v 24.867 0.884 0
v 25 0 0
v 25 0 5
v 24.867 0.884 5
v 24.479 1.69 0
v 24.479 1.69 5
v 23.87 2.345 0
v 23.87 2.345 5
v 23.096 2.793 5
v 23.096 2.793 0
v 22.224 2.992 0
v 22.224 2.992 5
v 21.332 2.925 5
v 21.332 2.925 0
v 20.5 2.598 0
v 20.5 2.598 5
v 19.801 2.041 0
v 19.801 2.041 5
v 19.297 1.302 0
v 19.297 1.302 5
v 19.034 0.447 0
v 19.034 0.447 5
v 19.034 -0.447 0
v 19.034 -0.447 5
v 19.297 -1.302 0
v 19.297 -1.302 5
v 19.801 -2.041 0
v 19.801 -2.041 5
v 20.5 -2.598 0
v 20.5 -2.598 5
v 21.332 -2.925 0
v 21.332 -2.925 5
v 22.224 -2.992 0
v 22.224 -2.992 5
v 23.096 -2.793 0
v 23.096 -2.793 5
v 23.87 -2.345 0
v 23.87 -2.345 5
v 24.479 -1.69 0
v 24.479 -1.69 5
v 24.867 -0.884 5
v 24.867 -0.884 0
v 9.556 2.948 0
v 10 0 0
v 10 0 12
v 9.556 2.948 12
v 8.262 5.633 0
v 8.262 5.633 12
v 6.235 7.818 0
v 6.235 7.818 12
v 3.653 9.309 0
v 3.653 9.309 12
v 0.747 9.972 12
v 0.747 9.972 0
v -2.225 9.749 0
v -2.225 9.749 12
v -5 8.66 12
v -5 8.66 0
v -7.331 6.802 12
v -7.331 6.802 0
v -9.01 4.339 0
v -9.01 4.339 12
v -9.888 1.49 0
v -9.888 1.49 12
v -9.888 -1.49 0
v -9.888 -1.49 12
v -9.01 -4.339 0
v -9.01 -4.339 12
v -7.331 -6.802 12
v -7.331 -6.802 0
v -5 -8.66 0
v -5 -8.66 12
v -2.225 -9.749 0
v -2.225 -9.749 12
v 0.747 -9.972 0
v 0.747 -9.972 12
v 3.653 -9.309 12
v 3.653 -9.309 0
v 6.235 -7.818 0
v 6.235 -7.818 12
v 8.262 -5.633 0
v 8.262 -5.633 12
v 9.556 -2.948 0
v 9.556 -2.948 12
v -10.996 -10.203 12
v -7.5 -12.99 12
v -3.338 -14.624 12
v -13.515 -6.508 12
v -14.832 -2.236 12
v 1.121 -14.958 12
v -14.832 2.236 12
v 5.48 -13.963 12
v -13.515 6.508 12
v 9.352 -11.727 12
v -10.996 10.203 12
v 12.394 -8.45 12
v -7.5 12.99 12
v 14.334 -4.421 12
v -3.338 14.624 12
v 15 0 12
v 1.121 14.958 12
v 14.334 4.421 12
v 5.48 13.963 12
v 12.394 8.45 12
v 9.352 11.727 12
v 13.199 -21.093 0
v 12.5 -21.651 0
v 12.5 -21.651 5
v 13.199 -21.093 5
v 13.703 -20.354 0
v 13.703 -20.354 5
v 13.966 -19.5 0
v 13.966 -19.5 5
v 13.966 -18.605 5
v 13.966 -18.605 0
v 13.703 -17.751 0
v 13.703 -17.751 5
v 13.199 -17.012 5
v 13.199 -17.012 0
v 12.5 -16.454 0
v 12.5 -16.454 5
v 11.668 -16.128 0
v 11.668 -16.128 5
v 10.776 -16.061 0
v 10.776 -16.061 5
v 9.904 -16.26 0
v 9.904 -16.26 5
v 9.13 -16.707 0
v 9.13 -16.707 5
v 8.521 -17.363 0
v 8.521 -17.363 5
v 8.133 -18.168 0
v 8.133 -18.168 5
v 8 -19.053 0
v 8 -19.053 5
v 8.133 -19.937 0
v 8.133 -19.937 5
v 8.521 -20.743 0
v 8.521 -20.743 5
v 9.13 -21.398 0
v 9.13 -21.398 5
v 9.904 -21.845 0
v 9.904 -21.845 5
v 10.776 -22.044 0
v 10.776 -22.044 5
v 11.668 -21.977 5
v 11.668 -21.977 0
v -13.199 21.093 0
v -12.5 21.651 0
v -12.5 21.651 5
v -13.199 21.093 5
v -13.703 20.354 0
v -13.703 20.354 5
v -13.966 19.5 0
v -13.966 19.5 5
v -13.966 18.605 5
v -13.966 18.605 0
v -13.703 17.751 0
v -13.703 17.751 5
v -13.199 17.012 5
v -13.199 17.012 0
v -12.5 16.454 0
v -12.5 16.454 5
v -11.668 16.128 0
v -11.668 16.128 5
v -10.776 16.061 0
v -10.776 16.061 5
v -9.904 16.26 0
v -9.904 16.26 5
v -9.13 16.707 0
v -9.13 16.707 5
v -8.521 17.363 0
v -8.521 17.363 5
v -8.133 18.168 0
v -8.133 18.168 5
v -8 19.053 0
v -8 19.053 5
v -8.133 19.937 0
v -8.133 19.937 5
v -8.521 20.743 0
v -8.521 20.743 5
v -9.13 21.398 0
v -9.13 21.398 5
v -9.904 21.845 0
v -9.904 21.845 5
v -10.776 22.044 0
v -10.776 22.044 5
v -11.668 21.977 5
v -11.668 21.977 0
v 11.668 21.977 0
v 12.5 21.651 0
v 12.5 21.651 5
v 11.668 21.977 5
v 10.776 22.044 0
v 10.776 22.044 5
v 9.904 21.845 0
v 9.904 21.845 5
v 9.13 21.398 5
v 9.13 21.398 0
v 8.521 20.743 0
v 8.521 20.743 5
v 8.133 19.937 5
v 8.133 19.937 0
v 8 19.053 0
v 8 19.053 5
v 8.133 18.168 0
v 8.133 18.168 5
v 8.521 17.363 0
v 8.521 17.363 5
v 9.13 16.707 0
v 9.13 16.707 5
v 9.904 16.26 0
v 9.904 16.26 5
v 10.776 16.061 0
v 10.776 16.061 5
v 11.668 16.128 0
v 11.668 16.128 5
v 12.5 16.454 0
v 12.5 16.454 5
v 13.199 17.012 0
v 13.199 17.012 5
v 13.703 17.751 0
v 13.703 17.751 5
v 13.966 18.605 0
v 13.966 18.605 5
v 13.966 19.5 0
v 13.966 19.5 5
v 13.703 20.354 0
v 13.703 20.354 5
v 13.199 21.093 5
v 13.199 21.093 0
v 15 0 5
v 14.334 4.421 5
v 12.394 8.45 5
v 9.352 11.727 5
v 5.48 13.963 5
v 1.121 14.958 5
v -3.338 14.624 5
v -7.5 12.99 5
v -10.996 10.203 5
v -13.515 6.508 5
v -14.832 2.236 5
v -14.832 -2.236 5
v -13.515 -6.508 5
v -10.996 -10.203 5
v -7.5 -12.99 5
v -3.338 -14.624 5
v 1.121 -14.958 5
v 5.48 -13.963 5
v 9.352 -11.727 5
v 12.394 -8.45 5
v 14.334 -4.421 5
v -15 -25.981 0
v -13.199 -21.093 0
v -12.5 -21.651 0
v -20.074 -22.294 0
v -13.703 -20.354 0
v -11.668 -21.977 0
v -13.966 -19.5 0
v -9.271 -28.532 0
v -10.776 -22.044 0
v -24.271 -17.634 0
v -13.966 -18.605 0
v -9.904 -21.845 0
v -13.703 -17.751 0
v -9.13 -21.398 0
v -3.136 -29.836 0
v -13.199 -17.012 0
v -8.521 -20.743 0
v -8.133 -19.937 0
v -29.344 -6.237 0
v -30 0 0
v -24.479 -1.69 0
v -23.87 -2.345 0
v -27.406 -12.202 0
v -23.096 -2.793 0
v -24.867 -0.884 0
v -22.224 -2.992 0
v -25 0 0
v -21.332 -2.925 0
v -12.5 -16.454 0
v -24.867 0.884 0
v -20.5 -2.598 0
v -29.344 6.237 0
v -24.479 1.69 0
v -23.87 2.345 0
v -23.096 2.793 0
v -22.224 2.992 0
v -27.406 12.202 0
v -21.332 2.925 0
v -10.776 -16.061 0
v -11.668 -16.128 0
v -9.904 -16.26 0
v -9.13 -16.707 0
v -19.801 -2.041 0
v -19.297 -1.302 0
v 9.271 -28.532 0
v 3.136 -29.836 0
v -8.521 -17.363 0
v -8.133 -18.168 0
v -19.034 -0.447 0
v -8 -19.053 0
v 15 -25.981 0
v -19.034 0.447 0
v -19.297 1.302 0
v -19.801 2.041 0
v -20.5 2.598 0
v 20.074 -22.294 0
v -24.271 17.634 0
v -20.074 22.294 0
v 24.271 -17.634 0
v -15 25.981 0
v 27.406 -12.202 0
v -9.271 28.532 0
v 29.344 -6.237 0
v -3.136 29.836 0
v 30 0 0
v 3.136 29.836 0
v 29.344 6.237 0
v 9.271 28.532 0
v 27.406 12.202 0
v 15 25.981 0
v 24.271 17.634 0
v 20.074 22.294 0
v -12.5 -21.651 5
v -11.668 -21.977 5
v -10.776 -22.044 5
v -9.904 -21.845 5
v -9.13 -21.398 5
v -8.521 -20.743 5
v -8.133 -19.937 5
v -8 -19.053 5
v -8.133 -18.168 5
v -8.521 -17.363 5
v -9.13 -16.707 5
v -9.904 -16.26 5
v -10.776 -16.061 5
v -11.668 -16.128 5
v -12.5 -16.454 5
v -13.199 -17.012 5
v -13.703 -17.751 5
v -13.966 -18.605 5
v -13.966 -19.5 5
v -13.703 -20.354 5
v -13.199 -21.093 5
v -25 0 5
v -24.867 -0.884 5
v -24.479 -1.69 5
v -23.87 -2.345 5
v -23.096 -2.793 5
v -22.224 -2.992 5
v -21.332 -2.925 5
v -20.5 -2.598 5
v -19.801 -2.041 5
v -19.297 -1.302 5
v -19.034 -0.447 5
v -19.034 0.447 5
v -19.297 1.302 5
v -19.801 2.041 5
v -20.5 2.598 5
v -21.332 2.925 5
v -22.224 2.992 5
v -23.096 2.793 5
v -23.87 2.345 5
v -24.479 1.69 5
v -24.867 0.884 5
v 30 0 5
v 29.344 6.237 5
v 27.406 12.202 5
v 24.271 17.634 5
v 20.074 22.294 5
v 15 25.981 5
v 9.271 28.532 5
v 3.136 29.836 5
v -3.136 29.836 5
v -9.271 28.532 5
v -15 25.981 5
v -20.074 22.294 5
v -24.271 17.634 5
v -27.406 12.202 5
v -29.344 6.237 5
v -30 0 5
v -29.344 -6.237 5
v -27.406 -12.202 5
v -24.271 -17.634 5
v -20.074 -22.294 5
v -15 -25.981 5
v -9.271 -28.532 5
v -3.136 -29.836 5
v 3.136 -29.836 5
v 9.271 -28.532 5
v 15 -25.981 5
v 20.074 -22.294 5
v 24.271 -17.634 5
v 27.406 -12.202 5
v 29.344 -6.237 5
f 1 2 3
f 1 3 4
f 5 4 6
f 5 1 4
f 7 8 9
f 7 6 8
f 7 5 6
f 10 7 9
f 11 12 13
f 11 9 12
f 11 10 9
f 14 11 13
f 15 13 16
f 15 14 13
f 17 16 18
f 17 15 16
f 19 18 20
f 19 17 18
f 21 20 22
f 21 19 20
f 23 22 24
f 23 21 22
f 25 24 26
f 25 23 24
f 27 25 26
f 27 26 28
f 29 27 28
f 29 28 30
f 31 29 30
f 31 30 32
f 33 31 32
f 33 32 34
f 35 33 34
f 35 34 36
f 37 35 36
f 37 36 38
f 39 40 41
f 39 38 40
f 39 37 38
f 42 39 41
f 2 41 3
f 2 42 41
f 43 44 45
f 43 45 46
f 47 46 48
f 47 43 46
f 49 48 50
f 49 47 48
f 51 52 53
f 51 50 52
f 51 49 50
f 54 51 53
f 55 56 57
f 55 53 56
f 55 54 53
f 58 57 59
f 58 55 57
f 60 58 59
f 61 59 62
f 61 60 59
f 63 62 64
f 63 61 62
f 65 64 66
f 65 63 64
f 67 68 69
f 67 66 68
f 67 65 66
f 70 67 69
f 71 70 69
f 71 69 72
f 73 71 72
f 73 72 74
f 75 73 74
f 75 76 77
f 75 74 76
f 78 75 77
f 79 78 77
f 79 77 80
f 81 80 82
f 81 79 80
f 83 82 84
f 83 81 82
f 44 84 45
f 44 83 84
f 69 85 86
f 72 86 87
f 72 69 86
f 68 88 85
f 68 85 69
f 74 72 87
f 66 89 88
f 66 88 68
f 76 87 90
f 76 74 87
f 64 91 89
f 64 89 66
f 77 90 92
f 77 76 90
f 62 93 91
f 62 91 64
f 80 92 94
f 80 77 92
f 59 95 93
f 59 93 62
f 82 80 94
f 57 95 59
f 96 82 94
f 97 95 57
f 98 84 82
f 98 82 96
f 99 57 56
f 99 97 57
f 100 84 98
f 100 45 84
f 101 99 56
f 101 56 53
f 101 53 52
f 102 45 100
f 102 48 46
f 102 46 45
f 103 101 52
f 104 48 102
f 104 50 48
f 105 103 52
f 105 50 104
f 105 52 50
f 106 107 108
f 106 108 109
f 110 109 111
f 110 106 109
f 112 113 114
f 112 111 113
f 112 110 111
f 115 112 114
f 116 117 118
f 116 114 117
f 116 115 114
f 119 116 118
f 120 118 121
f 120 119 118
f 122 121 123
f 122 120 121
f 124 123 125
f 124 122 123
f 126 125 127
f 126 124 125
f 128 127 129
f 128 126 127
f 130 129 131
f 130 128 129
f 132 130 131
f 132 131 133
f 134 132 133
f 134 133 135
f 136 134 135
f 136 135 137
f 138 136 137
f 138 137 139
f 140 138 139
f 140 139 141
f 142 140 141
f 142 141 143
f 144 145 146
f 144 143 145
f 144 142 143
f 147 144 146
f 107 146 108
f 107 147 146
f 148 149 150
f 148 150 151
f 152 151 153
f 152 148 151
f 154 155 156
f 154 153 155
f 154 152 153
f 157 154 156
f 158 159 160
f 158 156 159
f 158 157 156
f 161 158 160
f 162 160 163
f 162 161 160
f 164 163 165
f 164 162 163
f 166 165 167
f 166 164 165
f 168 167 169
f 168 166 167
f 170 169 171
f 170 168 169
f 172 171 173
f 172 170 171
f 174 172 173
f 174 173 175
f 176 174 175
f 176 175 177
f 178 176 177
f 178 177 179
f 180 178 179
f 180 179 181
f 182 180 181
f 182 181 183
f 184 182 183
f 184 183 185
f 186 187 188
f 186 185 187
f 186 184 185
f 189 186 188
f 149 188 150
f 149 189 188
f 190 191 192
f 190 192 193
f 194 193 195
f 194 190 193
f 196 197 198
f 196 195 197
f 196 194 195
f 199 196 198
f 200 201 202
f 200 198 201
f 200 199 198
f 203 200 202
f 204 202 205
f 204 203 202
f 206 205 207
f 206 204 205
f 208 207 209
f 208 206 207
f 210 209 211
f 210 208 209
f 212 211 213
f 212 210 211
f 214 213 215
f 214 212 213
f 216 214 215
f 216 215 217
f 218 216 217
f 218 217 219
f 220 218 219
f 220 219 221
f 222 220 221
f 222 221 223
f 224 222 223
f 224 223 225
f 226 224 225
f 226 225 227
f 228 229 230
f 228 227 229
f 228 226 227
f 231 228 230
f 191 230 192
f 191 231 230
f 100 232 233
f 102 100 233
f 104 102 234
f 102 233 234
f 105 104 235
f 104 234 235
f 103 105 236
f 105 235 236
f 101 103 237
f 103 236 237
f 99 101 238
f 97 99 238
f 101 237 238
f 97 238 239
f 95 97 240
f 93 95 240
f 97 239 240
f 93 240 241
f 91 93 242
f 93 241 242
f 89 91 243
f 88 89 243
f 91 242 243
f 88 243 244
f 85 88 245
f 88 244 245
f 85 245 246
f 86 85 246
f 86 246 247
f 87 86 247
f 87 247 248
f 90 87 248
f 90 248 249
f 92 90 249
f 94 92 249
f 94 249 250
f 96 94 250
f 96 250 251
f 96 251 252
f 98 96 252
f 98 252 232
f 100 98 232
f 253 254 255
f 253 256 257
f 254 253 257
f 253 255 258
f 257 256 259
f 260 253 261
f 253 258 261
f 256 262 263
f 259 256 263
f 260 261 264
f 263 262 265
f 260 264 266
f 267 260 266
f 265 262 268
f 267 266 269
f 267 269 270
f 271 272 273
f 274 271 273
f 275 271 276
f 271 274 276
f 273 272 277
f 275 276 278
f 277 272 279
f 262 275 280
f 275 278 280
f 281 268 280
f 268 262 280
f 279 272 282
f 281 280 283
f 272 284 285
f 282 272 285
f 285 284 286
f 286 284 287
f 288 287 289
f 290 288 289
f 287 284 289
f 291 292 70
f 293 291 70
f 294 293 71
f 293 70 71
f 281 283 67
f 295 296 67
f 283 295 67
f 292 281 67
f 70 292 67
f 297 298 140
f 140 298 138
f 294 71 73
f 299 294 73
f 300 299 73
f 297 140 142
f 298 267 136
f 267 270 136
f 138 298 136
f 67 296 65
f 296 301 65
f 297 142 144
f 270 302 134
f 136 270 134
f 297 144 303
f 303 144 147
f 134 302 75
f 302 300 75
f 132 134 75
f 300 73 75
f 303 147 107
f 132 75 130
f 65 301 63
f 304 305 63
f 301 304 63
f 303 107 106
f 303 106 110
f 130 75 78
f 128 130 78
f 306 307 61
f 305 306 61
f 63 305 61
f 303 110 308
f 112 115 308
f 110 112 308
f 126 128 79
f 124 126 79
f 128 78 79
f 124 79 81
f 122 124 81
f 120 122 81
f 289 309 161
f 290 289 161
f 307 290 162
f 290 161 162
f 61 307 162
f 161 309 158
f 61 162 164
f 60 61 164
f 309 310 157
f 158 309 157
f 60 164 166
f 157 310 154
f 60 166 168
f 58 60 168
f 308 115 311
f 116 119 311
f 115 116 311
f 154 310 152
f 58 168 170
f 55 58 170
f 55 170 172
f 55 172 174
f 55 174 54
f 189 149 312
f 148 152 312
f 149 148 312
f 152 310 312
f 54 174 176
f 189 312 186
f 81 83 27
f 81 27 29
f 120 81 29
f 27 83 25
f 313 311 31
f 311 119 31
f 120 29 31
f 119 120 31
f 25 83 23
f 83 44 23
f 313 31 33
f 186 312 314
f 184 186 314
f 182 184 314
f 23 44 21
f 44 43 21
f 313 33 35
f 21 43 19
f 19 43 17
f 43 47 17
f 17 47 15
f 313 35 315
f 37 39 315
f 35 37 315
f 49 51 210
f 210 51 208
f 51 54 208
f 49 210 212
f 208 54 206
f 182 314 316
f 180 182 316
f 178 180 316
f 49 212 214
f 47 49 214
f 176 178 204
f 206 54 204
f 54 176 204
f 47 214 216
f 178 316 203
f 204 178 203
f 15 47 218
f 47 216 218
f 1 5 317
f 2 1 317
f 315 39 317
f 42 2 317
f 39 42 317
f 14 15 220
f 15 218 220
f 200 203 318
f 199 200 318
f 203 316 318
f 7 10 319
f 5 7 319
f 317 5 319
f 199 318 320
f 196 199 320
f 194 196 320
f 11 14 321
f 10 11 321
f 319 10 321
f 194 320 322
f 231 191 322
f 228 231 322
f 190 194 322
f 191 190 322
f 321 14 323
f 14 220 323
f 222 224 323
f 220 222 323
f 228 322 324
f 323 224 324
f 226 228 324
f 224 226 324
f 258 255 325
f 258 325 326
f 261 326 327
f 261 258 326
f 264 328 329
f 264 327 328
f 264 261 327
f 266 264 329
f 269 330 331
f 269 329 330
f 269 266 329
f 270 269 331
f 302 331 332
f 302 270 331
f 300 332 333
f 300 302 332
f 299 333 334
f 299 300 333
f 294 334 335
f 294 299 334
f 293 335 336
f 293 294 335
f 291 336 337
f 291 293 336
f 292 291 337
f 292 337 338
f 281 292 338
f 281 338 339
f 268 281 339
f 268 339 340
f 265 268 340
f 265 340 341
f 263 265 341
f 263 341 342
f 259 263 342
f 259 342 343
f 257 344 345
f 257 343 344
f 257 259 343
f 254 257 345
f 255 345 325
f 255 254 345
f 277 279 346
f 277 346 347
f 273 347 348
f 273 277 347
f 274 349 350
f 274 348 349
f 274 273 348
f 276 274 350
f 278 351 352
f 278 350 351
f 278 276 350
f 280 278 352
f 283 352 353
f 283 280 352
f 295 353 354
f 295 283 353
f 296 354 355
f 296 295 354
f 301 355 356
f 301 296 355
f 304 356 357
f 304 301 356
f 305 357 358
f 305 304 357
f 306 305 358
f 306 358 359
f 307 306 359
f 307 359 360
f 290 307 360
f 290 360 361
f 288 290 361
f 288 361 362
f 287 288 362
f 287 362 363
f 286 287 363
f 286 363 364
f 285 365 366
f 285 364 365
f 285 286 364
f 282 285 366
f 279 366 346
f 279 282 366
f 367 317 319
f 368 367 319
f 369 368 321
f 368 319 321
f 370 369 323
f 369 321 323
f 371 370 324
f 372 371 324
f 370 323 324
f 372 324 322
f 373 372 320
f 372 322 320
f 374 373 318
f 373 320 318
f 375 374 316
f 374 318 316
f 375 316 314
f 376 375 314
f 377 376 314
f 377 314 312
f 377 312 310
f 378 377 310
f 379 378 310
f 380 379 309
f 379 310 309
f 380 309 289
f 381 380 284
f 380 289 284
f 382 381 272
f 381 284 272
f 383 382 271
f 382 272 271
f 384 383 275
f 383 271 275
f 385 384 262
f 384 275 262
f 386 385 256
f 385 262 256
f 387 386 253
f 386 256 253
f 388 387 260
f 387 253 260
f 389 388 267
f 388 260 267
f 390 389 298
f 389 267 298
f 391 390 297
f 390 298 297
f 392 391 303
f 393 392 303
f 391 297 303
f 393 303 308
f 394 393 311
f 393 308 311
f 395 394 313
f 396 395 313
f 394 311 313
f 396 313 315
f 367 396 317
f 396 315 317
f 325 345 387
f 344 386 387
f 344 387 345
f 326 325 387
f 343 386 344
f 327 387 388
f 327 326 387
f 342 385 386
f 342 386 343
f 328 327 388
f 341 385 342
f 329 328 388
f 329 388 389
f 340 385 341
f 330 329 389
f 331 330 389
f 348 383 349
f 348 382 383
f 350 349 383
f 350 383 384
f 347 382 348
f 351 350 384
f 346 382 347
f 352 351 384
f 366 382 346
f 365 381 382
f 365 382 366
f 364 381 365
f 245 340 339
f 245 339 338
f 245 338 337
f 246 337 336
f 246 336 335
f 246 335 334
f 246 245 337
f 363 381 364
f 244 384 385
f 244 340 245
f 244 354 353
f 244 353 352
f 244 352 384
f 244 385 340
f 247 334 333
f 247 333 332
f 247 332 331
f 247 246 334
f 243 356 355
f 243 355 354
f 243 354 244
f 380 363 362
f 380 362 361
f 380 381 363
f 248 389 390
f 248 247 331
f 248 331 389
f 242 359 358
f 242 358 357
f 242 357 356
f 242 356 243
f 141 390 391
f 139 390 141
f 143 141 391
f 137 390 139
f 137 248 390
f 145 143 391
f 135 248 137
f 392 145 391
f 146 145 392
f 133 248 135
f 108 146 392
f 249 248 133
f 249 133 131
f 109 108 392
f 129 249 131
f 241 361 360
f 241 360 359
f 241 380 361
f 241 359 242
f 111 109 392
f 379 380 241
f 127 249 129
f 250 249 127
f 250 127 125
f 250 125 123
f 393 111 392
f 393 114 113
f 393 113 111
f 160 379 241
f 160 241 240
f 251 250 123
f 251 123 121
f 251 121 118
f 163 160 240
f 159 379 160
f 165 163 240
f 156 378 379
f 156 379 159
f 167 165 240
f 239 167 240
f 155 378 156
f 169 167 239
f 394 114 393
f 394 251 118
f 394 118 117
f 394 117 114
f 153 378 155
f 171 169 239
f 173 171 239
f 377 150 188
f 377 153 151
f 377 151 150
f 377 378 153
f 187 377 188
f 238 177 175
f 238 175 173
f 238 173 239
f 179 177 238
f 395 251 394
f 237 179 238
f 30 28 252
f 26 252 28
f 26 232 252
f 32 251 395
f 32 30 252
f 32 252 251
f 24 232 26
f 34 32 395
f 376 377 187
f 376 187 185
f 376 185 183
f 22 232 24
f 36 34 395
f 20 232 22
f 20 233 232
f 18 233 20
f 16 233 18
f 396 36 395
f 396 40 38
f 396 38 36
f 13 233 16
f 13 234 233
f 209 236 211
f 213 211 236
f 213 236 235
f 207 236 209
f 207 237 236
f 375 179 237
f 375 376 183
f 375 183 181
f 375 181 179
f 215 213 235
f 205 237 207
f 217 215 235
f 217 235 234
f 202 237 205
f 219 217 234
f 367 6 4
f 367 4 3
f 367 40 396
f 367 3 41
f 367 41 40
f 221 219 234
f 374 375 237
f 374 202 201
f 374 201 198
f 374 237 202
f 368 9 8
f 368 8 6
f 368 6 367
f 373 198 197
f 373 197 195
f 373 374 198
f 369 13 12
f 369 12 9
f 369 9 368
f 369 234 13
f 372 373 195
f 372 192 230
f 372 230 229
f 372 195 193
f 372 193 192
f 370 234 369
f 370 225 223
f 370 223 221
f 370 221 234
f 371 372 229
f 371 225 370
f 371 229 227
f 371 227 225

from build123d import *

# Parameters (mm, degrees)
CYLINDER003_R     = 3
CYLINDER003_DEPTH = 10
ARRAY_COUNT       = 6
CYLINDER002_R     = 10
CYLINDER002_DEPTH = 30
CYLINDER001_R     = 15
CYLINDER001_DEPTH = 12
CYLINDER_R        = 30
CYLINDER_DEPTH    = 5


with BuildPart() as array:
    # Cylinder003 → Cylinder003 (new body)
    with BuildSketch(Plane(origin=(22, 0, -1), x_dir=(1, 0, 0), z_dir=(0, 0, 1))):
        Circle(CYLINDER003_R)
    extrude(amount=CYLINDER003_DEPTH)

    # Array: Array ×6 about axis
    array_axis = Axis((0, 0, 0), (0, 0, 1))


with BuildPart() as array_1:
    add(array.part)
    for i in range(1, ARRAY_COUNT):
        add(array.part.rotate(array_axis, i * 360 / ARRAY_COUNT))


with BuildPart() as tub_interior:
    # Cylinder002 → Cylinder002 (new body)
    with BuildSketch(Plane.XY.offset(-1)):
        Circle(CYLINDER002_R)
    extrude(amount=CYLINDER002_DEPTH)


with BuildPart() as tub_exterior:
    # Cylinder001 → Cylinder001 (new body)
    with BuildSketch(Plane.XY):
        Circle(CYLINDER001_R)
    extrude(amount=CYLINDER001_DEPTH)


with BuildPart() as cut001:
    # Cylinder → Cylinder (new body)
    with BuildSketch(Plane.XY):
        Circle(CYLINDER_R)
    extrude(amount=CYLINDER_DEPTH)

    # Fusion: union tub_exterior
    add(tub_exterior.part)

    # Cut: cut tub_interior
    add(tub_interior.part, mode=Mode.SUBTRACT)

    # Cut001: cut Array
    add(array_1.part, mode=Mode.SUBTRACT)


solid = cut001.part
